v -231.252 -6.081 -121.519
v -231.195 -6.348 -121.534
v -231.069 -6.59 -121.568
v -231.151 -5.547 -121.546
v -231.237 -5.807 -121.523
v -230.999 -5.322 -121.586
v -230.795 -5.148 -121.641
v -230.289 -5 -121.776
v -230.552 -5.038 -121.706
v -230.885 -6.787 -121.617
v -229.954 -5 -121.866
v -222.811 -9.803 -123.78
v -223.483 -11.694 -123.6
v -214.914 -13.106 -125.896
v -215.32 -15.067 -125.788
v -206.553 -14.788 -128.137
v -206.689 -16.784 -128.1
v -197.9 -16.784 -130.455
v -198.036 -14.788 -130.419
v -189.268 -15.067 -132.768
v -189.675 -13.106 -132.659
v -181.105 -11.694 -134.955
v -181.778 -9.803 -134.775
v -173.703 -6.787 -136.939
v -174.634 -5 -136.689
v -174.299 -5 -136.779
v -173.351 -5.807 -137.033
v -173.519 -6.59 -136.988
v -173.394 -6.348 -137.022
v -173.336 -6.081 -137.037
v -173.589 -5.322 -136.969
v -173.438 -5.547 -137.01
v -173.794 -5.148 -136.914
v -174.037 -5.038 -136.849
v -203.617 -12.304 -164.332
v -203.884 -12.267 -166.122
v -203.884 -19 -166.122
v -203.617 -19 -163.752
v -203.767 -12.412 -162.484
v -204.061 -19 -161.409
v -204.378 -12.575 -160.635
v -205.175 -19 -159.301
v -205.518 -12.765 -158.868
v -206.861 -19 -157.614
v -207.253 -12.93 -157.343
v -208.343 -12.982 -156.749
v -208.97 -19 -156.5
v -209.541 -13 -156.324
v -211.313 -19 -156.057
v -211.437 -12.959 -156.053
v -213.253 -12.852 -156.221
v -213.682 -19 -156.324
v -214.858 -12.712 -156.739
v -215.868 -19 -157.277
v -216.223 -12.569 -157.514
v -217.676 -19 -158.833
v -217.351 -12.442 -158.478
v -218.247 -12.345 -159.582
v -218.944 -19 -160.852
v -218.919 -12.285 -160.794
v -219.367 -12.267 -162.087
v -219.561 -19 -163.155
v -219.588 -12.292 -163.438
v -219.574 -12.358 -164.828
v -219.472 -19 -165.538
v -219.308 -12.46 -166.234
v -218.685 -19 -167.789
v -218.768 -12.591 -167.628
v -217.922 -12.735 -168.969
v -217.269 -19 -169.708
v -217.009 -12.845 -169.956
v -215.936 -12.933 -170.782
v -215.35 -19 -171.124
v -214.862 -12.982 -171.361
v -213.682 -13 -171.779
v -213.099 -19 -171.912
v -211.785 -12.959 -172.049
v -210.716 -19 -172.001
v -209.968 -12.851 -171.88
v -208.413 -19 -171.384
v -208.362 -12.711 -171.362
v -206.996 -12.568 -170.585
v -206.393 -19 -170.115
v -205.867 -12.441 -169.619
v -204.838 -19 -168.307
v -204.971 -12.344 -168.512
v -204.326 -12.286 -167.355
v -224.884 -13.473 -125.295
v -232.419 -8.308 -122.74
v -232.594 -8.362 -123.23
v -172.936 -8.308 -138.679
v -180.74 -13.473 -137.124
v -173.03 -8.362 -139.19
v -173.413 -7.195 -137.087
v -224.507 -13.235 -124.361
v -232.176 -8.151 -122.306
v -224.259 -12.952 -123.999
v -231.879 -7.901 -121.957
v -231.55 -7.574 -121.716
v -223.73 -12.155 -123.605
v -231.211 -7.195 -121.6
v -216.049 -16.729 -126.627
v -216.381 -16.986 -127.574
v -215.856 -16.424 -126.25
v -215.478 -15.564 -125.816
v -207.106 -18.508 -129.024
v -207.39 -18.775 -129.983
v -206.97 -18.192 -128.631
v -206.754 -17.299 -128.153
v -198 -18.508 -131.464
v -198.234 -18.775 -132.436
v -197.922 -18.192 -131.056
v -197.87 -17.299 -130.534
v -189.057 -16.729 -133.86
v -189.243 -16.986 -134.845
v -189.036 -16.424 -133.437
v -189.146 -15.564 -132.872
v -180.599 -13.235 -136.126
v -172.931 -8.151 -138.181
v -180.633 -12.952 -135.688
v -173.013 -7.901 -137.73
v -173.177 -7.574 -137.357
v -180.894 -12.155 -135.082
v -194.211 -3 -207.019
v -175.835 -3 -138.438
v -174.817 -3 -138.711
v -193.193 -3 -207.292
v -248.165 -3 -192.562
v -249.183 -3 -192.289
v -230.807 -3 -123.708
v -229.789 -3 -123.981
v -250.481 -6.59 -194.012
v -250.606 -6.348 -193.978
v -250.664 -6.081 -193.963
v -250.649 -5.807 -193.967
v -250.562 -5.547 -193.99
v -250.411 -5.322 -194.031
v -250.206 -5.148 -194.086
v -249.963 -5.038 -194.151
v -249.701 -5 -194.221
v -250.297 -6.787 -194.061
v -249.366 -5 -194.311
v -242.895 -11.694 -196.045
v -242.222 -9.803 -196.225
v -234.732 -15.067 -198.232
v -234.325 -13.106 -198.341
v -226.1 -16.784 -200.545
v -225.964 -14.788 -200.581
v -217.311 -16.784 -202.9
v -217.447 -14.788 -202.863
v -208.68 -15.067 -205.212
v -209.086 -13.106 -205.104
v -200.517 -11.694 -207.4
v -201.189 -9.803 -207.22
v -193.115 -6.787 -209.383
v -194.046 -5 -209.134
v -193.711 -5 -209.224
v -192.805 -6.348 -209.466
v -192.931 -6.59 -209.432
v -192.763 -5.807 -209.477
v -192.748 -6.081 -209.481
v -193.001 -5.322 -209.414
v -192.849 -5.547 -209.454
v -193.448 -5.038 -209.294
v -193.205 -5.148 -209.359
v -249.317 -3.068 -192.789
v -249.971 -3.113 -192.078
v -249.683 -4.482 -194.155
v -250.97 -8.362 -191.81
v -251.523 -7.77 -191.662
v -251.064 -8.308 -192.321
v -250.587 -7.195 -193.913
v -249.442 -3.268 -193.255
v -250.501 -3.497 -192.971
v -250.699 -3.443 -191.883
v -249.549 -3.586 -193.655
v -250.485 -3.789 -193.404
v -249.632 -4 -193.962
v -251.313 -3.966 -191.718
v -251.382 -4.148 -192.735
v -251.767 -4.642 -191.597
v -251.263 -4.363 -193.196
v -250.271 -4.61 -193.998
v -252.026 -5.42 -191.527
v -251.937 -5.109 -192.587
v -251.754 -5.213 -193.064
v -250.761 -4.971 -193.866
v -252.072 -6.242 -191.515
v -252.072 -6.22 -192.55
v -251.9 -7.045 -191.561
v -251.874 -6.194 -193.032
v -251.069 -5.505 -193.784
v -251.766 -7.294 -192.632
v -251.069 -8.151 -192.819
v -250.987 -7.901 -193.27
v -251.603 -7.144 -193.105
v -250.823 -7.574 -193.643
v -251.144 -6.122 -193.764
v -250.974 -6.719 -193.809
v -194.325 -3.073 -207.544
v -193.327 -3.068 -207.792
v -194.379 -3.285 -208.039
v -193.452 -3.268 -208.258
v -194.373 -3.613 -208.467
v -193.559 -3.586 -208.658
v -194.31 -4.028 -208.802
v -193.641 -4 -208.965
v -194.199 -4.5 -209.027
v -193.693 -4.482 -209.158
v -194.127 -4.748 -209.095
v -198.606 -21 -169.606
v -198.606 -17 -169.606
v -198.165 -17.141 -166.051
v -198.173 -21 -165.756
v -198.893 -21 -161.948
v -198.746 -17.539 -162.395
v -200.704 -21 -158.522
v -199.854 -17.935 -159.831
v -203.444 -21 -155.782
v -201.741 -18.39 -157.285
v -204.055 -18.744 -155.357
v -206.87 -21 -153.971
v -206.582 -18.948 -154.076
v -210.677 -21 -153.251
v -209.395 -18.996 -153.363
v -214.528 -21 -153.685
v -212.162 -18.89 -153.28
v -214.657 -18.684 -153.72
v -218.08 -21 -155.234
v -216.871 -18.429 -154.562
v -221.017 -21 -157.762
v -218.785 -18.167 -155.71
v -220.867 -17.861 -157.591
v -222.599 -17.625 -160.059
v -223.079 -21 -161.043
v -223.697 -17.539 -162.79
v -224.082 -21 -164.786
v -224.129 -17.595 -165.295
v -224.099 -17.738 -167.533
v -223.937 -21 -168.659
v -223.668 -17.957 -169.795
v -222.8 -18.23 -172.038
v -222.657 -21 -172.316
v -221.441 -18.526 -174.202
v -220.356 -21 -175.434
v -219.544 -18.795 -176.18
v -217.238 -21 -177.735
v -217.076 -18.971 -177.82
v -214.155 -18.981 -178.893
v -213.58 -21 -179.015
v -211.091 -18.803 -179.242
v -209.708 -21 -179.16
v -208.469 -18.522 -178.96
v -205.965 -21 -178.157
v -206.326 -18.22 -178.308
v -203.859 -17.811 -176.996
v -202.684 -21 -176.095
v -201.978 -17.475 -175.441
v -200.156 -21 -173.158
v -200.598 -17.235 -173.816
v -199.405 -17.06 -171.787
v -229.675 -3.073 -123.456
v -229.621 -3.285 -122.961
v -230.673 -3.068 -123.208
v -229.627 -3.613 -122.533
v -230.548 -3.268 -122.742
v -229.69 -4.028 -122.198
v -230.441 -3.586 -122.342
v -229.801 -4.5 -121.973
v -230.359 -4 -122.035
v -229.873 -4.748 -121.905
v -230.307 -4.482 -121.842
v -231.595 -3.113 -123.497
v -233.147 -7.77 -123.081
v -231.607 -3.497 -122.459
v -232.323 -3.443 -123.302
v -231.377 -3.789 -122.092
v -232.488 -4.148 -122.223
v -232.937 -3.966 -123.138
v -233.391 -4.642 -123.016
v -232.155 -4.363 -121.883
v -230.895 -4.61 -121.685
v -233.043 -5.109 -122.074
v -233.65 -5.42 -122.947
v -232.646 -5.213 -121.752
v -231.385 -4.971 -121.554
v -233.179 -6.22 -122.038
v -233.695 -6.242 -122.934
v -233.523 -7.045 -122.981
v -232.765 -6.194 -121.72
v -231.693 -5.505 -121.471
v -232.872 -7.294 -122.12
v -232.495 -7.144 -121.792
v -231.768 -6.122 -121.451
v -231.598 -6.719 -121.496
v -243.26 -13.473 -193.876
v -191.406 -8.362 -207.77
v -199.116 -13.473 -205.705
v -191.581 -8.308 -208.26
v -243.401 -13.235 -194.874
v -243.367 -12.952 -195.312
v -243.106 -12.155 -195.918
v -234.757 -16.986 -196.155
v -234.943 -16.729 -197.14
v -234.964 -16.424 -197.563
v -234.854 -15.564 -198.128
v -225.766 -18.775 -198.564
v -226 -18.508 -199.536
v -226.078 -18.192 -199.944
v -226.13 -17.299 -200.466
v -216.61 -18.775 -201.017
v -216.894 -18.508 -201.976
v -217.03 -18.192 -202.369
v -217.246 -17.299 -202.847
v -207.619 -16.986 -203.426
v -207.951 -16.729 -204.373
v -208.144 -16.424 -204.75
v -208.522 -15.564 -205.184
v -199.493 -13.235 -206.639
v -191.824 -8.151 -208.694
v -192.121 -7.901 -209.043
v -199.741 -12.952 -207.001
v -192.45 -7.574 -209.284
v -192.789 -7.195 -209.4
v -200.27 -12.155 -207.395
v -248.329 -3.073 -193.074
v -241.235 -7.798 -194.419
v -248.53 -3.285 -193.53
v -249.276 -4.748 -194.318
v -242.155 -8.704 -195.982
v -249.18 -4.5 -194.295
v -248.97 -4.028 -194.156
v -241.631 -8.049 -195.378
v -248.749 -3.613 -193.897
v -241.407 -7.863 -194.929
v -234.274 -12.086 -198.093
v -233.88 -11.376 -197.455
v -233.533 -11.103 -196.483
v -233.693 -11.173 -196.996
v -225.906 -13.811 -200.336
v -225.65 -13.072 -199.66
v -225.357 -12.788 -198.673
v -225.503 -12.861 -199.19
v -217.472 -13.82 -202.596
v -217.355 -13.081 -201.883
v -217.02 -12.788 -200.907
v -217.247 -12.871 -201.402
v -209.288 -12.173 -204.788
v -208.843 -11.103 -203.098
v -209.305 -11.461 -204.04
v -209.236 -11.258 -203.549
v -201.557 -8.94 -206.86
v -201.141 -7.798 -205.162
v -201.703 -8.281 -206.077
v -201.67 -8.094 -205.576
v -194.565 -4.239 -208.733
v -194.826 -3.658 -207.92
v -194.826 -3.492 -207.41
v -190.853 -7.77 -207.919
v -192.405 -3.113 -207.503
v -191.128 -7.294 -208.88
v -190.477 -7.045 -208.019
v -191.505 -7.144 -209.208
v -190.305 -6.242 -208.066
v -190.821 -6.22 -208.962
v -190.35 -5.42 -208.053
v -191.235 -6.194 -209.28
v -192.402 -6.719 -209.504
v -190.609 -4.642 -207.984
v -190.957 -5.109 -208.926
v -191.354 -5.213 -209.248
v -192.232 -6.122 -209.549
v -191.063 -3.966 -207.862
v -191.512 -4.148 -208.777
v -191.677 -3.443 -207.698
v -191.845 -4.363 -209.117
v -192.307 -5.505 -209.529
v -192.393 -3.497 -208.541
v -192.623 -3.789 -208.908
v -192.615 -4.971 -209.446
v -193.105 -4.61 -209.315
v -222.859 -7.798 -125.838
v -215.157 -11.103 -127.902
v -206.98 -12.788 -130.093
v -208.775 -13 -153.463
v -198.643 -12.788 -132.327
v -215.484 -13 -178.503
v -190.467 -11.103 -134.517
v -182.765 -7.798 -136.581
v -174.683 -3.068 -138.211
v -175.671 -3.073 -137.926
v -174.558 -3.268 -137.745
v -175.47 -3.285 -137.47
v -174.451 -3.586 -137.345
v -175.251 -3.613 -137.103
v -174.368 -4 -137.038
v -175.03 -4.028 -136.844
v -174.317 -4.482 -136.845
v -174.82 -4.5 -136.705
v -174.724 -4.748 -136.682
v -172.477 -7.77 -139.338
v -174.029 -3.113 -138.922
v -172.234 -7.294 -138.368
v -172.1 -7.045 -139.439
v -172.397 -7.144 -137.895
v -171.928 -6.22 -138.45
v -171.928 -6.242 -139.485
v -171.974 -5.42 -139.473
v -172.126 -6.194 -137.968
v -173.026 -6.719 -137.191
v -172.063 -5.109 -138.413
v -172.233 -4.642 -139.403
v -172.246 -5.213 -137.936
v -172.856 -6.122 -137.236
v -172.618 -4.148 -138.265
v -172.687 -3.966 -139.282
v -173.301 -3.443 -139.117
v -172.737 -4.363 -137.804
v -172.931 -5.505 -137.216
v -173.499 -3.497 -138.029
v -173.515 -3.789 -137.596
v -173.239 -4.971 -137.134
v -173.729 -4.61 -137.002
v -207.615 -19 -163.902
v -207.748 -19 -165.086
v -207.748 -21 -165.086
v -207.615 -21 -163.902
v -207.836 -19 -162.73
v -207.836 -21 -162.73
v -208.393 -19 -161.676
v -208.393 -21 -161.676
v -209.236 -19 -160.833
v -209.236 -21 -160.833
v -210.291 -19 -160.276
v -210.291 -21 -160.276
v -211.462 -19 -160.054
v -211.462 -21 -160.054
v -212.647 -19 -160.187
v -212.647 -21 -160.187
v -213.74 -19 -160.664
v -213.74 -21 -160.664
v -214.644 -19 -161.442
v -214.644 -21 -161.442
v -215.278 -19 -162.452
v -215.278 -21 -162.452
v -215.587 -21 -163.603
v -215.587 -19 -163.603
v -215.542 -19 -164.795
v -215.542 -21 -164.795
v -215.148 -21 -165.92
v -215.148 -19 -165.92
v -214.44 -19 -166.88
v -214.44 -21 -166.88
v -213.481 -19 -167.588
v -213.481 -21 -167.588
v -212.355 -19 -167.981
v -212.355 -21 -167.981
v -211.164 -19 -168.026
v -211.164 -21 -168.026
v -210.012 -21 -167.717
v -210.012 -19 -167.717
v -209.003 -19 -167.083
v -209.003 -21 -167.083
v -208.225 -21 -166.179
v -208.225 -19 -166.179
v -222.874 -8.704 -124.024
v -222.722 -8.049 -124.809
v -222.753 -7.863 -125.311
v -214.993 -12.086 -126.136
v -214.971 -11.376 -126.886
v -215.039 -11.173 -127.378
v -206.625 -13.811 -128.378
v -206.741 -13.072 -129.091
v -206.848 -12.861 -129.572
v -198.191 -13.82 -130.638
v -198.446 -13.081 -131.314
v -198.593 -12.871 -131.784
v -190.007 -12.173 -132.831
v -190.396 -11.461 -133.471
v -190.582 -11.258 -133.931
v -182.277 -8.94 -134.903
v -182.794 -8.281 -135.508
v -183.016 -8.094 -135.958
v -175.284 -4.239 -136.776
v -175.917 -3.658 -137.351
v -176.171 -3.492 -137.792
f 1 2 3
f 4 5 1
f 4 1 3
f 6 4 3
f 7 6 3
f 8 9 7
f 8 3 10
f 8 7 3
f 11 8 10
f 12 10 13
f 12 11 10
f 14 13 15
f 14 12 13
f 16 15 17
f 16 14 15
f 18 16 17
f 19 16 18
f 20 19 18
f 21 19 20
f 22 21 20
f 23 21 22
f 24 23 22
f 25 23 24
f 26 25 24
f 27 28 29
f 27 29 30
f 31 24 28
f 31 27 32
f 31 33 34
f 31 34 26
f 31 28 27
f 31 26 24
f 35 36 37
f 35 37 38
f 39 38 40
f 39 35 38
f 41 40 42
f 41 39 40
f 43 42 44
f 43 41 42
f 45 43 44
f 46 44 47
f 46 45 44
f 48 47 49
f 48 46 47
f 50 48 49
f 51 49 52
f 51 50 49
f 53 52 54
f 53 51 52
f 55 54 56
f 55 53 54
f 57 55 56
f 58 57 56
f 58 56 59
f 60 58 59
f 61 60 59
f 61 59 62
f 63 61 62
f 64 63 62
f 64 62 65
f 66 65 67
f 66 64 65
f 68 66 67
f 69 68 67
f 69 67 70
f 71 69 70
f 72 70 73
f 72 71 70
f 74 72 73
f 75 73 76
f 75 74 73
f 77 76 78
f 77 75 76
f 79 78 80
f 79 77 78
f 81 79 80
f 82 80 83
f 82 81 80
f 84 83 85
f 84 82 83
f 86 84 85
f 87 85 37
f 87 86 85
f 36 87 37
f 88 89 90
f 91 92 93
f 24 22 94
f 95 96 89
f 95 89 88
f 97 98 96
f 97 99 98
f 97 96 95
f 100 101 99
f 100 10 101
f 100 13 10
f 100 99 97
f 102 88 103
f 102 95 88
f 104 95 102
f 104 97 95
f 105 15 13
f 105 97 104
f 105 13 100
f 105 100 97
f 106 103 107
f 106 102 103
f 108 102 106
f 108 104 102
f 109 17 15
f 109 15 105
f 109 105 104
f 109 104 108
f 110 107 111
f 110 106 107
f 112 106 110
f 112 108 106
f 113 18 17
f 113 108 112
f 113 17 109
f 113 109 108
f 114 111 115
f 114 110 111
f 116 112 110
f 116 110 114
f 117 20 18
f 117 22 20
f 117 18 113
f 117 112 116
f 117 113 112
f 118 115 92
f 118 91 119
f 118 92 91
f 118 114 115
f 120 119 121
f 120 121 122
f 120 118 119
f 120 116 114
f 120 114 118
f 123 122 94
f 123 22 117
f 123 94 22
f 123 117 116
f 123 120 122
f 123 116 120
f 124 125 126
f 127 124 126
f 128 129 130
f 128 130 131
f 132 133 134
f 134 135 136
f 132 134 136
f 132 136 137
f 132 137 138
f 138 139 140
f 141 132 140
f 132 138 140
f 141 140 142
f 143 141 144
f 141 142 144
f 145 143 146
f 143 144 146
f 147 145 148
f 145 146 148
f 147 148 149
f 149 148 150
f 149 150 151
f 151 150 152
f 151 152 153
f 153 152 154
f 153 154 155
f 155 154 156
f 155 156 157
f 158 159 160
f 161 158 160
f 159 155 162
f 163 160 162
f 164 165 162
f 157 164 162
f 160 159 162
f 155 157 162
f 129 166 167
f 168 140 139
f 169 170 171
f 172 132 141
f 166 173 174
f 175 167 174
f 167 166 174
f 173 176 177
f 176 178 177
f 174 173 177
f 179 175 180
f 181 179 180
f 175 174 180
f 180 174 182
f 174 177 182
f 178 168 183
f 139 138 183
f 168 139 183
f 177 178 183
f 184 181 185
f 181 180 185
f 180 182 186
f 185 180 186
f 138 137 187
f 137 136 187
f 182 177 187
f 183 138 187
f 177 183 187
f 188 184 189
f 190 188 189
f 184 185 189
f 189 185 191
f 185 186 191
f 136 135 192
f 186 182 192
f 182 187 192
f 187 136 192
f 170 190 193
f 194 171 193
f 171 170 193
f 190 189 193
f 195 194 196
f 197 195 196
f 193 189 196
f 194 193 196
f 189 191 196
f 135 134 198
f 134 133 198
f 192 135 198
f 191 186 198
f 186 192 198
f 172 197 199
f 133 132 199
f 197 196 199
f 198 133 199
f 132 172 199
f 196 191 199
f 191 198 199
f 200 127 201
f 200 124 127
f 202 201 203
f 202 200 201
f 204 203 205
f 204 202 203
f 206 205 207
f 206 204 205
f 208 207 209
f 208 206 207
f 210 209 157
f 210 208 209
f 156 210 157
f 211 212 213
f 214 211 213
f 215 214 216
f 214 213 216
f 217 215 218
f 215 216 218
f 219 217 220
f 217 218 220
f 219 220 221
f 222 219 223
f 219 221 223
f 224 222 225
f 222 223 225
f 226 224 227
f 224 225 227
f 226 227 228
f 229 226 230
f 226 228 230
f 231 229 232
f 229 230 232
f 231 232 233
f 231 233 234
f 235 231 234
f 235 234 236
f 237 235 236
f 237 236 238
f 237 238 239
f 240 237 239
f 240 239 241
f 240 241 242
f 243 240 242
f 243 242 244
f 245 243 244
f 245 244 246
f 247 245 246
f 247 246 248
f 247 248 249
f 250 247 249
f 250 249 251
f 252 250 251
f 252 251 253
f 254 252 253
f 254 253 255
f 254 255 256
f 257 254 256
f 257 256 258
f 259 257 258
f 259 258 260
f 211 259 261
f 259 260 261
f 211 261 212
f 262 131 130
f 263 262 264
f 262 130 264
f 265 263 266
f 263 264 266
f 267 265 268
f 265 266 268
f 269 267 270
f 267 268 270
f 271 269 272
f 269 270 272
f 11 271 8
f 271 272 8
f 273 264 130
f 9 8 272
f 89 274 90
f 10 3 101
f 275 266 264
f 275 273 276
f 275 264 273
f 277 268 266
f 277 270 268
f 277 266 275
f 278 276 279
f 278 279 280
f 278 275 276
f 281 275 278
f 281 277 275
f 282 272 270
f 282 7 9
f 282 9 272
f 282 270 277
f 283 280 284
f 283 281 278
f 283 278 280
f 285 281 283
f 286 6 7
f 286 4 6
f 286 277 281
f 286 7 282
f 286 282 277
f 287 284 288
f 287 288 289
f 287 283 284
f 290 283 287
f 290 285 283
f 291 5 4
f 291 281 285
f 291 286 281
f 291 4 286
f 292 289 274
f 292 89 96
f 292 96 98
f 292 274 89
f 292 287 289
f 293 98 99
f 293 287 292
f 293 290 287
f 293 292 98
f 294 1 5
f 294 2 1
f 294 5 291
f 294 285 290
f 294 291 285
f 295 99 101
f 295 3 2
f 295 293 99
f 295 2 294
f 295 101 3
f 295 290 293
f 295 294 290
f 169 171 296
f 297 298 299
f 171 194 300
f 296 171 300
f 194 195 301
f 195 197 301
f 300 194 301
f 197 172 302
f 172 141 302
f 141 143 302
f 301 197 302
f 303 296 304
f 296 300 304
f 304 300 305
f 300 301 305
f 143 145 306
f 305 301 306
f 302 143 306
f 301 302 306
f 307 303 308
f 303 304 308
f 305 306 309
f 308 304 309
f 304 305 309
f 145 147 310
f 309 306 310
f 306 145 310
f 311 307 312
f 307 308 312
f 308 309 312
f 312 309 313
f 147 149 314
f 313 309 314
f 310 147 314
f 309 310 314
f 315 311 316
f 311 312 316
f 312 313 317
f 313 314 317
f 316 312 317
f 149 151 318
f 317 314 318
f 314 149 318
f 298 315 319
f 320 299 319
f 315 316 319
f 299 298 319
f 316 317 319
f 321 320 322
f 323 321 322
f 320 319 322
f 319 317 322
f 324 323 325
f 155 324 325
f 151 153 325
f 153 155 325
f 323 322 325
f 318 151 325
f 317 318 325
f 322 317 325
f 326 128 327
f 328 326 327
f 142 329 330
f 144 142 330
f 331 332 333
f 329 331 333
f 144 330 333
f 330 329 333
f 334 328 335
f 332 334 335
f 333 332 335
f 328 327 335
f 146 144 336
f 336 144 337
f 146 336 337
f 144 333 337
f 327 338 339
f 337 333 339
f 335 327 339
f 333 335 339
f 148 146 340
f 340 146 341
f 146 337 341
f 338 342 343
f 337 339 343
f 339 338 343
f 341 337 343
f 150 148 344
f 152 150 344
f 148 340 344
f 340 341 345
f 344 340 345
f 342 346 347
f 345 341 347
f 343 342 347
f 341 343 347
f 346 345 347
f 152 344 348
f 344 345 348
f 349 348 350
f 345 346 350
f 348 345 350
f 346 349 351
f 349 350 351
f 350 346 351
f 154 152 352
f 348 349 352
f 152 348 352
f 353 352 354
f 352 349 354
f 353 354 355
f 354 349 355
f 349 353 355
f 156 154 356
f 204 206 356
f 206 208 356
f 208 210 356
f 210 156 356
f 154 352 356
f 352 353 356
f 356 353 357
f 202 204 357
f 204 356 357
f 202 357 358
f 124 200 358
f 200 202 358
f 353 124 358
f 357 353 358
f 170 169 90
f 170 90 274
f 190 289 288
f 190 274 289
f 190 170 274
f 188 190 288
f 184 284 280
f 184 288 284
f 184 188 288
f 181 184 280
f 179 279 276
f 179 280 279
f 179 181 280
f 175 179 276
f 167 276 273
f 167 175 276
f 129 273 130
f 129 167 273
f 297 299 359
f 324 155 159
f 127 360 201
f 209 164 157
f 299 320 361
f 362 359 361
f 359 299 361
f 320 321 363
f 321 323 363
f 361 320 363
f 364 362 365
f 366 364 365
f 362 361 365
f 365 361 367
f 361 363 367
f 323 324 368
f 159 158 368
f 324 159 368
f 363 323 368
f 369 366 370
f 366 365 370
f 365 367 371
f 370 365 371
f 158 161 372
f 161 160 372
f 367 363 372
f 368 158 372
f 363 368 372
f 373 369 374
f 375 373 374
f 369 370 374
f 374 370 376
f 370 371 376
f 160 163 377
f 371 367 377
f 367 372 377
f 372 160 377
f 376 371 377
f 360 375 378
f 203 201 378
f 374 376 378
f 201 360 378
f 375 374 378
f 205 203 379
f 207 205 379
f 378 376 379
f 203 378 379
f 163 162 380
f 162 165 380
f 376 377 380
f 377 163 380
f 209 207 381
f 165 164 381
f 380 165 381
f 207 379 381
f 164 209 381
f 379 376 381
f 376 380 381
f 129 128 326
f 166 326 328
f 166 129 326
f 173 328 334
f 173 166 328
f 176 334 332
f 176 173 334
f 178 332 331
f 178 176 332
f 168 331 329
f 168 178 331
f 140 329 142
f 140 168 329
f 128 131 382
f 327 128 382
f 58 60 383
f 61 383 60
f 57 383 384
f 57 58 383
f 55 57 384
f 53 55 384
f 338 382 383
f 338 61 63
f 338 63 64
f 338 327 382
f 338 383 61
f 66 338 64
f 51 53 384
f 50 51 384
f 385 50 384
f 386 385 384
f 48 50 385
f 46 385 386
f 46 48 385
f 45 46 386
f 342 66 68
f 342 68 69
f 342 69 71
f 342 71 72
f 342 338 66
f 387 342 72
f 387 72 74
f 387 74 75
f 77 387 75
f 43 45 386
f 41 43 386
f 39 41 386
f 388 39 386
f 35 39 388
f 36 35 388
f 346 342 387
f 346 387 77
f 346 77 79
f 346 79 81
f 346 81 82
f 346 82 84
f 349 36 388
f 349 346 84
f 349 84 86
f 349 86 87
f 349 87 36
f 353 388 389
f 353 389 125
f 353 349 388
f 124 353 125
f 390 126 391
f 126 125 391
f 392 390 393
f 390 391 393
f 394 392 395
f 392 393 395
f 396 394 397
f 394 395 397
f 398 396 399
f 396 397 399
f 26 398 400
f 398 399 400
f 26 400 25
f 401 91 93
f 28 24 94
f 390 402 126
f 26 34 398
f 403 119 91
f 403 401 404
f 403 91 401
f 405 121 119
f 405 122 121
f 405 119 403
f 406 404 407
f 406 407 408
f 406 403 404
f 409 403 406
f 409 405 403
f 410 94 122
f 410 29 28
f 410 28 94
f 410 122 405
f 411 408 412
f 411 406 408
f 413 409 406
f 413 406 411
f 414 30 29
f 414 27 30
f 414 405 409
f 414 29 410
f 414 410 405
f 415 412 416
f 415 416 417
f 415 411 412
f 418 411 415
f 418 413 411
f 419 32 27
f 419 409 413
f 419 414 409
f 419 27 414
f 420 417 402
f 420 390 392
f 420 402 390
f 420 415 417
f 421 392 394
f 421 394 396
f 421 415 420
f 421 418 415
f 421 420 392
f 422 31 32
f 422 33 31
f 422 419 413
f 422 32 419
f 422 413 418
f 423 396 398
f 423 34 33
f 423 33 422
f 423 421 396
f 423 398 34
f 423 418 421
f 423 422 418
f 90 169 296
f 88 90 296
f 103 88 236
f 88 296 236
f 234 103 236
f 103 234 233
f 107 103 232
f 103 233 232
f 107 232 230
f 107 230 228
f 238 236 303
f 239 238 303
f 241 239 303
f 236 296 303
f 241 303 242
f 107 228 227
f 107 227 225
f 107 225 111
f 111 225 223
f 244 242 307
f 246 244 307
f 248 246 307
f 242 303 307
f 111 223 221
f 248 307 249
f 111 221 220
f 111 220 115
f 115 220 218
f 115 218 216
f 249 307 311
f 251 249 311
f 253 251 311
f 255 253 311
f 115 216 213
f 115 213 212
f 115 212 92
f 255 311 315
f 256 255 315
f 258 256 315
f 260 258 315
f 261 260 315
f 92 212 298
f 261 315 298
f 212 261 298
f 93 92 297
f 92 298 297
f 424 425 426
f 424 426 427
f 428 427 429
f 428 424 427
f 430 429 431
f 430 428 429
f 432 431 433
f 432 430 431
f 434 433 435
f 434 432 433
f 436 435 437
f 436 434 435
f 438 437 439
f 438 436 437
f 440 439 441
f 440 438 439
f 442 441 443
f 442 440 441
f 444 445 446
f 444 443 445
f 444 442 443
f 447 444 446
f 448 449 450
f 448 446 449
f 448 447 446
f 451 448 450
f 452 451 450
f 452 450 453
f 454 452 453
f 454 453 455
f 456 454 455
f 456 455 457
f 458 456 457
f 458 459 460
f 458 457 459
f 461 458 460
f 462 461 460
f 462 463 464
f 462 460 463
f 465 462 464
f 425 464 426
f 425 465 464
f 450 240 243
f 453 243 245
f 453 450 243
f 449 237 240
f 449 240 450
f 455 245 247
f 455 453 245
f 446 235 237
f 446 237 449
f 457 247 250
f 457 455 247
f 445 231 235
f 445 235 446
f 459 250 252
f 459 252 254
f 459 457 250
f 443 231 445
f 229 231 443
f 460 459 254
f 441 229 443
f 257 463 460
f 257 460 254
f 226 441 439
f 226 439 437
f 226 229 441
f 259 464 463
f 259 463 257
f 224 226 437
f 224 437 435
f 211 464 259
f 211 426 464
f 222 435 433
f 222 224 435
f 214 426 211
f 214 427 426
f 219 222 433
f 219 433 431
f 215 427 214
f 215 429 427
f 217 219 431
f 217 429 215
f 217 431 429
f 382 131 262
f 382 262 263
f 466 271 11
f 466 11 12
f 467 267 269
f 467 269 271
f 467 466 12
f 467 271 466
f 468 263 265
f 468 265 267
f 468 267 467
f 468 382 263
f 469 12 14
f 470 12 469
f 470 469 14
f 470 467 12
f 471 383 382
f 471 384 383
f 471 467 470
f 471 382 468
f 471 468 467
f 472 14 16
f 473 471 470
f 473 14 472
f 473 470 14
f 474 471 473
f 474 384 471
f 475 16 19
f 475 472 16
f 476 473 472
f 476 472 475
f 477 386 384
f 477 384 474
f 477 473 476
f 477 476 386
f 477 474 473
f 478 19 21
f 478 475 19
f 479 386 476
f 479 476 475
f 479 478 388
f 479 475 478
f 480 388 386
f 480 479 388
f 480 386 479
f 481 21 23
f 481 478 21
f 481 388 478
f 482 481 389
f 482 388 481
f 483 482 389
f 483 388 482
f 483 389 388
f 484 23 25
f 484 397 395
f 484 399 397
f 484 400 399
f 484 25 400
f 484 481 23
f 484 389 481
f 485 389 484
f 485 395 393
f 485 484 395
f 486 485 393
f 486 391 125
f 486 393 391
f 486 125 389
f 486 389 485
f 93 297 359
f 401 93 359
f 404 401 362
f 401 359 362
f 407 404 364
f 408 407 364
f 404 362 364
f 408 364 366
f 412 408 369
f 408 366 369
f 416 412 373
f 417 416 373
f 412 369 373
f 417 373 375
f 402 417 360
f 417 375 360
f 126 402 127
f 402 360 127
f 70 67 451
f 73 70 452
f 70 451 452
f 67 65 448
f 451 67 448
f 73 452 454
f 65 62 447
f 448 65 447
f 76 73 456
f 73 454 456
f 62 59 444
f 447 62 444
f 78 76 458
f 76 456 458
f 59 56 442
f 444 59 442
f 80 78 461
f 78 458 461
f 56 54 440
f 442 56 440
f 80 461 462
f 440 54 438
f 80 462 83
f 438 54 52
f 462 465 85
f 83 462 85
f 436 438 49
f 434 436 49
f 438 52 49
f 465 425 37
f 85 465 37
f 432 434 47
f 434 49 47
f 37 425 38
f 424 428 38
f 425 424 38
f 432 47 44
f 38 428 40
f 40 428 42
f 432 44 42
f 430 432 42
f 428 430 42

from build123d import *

# Parameters (mm, degrees)
CYLINDER016_R          = 8
CYLINDER016_DEPTH      = 10
CYLINDER016_ROLL_ANGLE = 90
CYLINDER015_R          = 4
CYLINDER015_DEPTH      = 20
CYLINDER015_ROLL_ANGLE = 90
BOX016_W               = 120
BOX016_H               = 100
BOX016_DEPTH           = 150
CYLINDER014_R          = 44
CYLINDER014_DEPTH      = 75
CYLINDER013_R          = 50
CYLINDER013_DEPTH      = 75
CYLINDER012_R          = 13
CYLINDER012_DEPTH      = 8
CYLINDER012_ROLL_ANGLE = 90
FILLET012_R            = 3
FILLET013_R            = 2
FILLET014_R            = 2
CUT021_PITCH_ANGLE     = 15


with BuildPart() as cylindre016:
    # Cylinder016 → Cylinder016 (new body)
    with BuildSketch(Plane.XY):
        Circle(CYLINDER016_R)
    extrude(amount=CYLINDER016_DEPTH)


with BuildPart() as cylindre016_1:
    # Cylinder016 roll: moved
    add(cylindre016.part.rotate(Axis((0, 0, 0), (1, 0, 0)), CYLINDER016_ROLL_ANGLE))


with BuildPart() as cylindre016_2:
    # Cylinder016 placement: moved
    add(cylindre016_1.part.moved(Location((-212, -9, -164))))


with BuildPart() as cylindre015:
    # Cylinder015 → Cylinder015 (new body)
    with BuildSketch(Plane.XY):
        Circle(CYLINDER015_R)
    extrude(amount=CYLINDER015_DEPTH)


with BuildPart() as cylindre015_1:
    # Cylinder015 roll: moved
    add(cylindre015.part.rotate(Axis((0, 0, 0), (1, 0, 0)), CYLINDER015_ROLL_ANGLE))


with BuildPart() as cylindre015_2:
    # Cylinder015 placement: moved
    add(cylindre015_1.part.moved(Location((-212, -10, -164))))


with BuildPart() as cube016:
    # Box016 → Box016 (new body)
    with BuildSketch(Plane(origin=(-269, -3, -220), x_dir=(1, 0, 0), z_dir=(0, 0, 1))):
        with Locations((60, 50)):
            Rectangle(BOX016_W, BOX016_H)
    extrude(amount=BOX016_DEPTH)


with BuildPart() as cylindre014:
    # Cylinder014 → Cylinder014 (new body)
    with BuildSketch(Plane(origin=(-212, 31, -203), x_dir=(1, 0, 0), z_dir=(0, 0, 1))):
        Circle(CYLINDER014_R)
    extrude(amount=CYLINDER014_DEPTH)


with BuildPart() as cut017:
    # Cylinder013 → Cylinder013 (new body)
    with BuildSketch(Plane(origin=(-212, 31, -203), x_dir=(1, 0, 0), z_dir=(0, 0, 1))):
        Circle(CYLINDER013_R)
    extrude(amount=CYLINDER013_DEPTH)

    # Cut017: cut Cylindre014
    add(cylindre014.part, mode=Mode.SUBTRACT)


with BuildPart() as cut021:
    # Cylinder012 → Cylinder012 (new body)
    with BuildSketch(Plane.XY):
        Circle(CYLINDER012_R)
    extrude(amount=CYLINDER012_DEPTH)


with BuildPart() as cut021_1:
    # Cylinder012 roll: moved
    add(cut021.part.rotate(Axis((0, 0, 0), (1, 0, 0)), CYLINDER012_ROLL_ANGLE))


with BuildPart() as cut021_2:
    # Cylinder012 placement: moved
    add(cut021_1.part.moved(Location((-211, -13, -166))))

    # Fusion011: union Cut017
    add(cut017.part)

    # Cut018: cut Cube016
    add(cube016.part, mode=Mode.SUBTRACT)

    # Fillet012
    fillet012_edges = [cut021_2.edges().sort_by_distance(p)[0] for p in [
        (-175.339394, -3, -165.5),
        (-248.660606, -3, -165.5),
    ]]
    fillet(fillet012_edges, radius=FILLET012_R)

    # Fillet013
    fillet013_edges = [cut021_2.edges().sort_by_distance(p)[0] for p in [
        (-212, -19, -203),
        (-212, -13, -203),
    ]]
    fillet(fillet013_edges, radius=FILLET013_R)

    # Fillet014
    fillet014_edges = [cut021_2.edges().sort_by_distance(p)[0] for p in [
        (-212, -19, -128),
        (-212, -13, -128),
    ]]
    fillet(fillet014_edges, radius=FILLET014_R)

    # Cut019: cut Cylindre015
    add(cylindre015_2.part, mode=Mode.SUBTRACT)

    # Cut021: cut Cylindre016
    add(cylindre016_2.part, mode=Mode.SUBTRACT)


with BuildPart() as cut021_3:
    # Cut021 pitch: moved
    add(cut021_2.part.rotate(Axis((0, 0, 0), (0, 1, 0)), CUT021_PITCH_ANGLE))


with BuildPart() as cut021_4:
    # Cut021 placement: moved
    add(cut021_3.part.moved(Location((35.610827, 0, -60.508913))))


solid = cut021_4.part
